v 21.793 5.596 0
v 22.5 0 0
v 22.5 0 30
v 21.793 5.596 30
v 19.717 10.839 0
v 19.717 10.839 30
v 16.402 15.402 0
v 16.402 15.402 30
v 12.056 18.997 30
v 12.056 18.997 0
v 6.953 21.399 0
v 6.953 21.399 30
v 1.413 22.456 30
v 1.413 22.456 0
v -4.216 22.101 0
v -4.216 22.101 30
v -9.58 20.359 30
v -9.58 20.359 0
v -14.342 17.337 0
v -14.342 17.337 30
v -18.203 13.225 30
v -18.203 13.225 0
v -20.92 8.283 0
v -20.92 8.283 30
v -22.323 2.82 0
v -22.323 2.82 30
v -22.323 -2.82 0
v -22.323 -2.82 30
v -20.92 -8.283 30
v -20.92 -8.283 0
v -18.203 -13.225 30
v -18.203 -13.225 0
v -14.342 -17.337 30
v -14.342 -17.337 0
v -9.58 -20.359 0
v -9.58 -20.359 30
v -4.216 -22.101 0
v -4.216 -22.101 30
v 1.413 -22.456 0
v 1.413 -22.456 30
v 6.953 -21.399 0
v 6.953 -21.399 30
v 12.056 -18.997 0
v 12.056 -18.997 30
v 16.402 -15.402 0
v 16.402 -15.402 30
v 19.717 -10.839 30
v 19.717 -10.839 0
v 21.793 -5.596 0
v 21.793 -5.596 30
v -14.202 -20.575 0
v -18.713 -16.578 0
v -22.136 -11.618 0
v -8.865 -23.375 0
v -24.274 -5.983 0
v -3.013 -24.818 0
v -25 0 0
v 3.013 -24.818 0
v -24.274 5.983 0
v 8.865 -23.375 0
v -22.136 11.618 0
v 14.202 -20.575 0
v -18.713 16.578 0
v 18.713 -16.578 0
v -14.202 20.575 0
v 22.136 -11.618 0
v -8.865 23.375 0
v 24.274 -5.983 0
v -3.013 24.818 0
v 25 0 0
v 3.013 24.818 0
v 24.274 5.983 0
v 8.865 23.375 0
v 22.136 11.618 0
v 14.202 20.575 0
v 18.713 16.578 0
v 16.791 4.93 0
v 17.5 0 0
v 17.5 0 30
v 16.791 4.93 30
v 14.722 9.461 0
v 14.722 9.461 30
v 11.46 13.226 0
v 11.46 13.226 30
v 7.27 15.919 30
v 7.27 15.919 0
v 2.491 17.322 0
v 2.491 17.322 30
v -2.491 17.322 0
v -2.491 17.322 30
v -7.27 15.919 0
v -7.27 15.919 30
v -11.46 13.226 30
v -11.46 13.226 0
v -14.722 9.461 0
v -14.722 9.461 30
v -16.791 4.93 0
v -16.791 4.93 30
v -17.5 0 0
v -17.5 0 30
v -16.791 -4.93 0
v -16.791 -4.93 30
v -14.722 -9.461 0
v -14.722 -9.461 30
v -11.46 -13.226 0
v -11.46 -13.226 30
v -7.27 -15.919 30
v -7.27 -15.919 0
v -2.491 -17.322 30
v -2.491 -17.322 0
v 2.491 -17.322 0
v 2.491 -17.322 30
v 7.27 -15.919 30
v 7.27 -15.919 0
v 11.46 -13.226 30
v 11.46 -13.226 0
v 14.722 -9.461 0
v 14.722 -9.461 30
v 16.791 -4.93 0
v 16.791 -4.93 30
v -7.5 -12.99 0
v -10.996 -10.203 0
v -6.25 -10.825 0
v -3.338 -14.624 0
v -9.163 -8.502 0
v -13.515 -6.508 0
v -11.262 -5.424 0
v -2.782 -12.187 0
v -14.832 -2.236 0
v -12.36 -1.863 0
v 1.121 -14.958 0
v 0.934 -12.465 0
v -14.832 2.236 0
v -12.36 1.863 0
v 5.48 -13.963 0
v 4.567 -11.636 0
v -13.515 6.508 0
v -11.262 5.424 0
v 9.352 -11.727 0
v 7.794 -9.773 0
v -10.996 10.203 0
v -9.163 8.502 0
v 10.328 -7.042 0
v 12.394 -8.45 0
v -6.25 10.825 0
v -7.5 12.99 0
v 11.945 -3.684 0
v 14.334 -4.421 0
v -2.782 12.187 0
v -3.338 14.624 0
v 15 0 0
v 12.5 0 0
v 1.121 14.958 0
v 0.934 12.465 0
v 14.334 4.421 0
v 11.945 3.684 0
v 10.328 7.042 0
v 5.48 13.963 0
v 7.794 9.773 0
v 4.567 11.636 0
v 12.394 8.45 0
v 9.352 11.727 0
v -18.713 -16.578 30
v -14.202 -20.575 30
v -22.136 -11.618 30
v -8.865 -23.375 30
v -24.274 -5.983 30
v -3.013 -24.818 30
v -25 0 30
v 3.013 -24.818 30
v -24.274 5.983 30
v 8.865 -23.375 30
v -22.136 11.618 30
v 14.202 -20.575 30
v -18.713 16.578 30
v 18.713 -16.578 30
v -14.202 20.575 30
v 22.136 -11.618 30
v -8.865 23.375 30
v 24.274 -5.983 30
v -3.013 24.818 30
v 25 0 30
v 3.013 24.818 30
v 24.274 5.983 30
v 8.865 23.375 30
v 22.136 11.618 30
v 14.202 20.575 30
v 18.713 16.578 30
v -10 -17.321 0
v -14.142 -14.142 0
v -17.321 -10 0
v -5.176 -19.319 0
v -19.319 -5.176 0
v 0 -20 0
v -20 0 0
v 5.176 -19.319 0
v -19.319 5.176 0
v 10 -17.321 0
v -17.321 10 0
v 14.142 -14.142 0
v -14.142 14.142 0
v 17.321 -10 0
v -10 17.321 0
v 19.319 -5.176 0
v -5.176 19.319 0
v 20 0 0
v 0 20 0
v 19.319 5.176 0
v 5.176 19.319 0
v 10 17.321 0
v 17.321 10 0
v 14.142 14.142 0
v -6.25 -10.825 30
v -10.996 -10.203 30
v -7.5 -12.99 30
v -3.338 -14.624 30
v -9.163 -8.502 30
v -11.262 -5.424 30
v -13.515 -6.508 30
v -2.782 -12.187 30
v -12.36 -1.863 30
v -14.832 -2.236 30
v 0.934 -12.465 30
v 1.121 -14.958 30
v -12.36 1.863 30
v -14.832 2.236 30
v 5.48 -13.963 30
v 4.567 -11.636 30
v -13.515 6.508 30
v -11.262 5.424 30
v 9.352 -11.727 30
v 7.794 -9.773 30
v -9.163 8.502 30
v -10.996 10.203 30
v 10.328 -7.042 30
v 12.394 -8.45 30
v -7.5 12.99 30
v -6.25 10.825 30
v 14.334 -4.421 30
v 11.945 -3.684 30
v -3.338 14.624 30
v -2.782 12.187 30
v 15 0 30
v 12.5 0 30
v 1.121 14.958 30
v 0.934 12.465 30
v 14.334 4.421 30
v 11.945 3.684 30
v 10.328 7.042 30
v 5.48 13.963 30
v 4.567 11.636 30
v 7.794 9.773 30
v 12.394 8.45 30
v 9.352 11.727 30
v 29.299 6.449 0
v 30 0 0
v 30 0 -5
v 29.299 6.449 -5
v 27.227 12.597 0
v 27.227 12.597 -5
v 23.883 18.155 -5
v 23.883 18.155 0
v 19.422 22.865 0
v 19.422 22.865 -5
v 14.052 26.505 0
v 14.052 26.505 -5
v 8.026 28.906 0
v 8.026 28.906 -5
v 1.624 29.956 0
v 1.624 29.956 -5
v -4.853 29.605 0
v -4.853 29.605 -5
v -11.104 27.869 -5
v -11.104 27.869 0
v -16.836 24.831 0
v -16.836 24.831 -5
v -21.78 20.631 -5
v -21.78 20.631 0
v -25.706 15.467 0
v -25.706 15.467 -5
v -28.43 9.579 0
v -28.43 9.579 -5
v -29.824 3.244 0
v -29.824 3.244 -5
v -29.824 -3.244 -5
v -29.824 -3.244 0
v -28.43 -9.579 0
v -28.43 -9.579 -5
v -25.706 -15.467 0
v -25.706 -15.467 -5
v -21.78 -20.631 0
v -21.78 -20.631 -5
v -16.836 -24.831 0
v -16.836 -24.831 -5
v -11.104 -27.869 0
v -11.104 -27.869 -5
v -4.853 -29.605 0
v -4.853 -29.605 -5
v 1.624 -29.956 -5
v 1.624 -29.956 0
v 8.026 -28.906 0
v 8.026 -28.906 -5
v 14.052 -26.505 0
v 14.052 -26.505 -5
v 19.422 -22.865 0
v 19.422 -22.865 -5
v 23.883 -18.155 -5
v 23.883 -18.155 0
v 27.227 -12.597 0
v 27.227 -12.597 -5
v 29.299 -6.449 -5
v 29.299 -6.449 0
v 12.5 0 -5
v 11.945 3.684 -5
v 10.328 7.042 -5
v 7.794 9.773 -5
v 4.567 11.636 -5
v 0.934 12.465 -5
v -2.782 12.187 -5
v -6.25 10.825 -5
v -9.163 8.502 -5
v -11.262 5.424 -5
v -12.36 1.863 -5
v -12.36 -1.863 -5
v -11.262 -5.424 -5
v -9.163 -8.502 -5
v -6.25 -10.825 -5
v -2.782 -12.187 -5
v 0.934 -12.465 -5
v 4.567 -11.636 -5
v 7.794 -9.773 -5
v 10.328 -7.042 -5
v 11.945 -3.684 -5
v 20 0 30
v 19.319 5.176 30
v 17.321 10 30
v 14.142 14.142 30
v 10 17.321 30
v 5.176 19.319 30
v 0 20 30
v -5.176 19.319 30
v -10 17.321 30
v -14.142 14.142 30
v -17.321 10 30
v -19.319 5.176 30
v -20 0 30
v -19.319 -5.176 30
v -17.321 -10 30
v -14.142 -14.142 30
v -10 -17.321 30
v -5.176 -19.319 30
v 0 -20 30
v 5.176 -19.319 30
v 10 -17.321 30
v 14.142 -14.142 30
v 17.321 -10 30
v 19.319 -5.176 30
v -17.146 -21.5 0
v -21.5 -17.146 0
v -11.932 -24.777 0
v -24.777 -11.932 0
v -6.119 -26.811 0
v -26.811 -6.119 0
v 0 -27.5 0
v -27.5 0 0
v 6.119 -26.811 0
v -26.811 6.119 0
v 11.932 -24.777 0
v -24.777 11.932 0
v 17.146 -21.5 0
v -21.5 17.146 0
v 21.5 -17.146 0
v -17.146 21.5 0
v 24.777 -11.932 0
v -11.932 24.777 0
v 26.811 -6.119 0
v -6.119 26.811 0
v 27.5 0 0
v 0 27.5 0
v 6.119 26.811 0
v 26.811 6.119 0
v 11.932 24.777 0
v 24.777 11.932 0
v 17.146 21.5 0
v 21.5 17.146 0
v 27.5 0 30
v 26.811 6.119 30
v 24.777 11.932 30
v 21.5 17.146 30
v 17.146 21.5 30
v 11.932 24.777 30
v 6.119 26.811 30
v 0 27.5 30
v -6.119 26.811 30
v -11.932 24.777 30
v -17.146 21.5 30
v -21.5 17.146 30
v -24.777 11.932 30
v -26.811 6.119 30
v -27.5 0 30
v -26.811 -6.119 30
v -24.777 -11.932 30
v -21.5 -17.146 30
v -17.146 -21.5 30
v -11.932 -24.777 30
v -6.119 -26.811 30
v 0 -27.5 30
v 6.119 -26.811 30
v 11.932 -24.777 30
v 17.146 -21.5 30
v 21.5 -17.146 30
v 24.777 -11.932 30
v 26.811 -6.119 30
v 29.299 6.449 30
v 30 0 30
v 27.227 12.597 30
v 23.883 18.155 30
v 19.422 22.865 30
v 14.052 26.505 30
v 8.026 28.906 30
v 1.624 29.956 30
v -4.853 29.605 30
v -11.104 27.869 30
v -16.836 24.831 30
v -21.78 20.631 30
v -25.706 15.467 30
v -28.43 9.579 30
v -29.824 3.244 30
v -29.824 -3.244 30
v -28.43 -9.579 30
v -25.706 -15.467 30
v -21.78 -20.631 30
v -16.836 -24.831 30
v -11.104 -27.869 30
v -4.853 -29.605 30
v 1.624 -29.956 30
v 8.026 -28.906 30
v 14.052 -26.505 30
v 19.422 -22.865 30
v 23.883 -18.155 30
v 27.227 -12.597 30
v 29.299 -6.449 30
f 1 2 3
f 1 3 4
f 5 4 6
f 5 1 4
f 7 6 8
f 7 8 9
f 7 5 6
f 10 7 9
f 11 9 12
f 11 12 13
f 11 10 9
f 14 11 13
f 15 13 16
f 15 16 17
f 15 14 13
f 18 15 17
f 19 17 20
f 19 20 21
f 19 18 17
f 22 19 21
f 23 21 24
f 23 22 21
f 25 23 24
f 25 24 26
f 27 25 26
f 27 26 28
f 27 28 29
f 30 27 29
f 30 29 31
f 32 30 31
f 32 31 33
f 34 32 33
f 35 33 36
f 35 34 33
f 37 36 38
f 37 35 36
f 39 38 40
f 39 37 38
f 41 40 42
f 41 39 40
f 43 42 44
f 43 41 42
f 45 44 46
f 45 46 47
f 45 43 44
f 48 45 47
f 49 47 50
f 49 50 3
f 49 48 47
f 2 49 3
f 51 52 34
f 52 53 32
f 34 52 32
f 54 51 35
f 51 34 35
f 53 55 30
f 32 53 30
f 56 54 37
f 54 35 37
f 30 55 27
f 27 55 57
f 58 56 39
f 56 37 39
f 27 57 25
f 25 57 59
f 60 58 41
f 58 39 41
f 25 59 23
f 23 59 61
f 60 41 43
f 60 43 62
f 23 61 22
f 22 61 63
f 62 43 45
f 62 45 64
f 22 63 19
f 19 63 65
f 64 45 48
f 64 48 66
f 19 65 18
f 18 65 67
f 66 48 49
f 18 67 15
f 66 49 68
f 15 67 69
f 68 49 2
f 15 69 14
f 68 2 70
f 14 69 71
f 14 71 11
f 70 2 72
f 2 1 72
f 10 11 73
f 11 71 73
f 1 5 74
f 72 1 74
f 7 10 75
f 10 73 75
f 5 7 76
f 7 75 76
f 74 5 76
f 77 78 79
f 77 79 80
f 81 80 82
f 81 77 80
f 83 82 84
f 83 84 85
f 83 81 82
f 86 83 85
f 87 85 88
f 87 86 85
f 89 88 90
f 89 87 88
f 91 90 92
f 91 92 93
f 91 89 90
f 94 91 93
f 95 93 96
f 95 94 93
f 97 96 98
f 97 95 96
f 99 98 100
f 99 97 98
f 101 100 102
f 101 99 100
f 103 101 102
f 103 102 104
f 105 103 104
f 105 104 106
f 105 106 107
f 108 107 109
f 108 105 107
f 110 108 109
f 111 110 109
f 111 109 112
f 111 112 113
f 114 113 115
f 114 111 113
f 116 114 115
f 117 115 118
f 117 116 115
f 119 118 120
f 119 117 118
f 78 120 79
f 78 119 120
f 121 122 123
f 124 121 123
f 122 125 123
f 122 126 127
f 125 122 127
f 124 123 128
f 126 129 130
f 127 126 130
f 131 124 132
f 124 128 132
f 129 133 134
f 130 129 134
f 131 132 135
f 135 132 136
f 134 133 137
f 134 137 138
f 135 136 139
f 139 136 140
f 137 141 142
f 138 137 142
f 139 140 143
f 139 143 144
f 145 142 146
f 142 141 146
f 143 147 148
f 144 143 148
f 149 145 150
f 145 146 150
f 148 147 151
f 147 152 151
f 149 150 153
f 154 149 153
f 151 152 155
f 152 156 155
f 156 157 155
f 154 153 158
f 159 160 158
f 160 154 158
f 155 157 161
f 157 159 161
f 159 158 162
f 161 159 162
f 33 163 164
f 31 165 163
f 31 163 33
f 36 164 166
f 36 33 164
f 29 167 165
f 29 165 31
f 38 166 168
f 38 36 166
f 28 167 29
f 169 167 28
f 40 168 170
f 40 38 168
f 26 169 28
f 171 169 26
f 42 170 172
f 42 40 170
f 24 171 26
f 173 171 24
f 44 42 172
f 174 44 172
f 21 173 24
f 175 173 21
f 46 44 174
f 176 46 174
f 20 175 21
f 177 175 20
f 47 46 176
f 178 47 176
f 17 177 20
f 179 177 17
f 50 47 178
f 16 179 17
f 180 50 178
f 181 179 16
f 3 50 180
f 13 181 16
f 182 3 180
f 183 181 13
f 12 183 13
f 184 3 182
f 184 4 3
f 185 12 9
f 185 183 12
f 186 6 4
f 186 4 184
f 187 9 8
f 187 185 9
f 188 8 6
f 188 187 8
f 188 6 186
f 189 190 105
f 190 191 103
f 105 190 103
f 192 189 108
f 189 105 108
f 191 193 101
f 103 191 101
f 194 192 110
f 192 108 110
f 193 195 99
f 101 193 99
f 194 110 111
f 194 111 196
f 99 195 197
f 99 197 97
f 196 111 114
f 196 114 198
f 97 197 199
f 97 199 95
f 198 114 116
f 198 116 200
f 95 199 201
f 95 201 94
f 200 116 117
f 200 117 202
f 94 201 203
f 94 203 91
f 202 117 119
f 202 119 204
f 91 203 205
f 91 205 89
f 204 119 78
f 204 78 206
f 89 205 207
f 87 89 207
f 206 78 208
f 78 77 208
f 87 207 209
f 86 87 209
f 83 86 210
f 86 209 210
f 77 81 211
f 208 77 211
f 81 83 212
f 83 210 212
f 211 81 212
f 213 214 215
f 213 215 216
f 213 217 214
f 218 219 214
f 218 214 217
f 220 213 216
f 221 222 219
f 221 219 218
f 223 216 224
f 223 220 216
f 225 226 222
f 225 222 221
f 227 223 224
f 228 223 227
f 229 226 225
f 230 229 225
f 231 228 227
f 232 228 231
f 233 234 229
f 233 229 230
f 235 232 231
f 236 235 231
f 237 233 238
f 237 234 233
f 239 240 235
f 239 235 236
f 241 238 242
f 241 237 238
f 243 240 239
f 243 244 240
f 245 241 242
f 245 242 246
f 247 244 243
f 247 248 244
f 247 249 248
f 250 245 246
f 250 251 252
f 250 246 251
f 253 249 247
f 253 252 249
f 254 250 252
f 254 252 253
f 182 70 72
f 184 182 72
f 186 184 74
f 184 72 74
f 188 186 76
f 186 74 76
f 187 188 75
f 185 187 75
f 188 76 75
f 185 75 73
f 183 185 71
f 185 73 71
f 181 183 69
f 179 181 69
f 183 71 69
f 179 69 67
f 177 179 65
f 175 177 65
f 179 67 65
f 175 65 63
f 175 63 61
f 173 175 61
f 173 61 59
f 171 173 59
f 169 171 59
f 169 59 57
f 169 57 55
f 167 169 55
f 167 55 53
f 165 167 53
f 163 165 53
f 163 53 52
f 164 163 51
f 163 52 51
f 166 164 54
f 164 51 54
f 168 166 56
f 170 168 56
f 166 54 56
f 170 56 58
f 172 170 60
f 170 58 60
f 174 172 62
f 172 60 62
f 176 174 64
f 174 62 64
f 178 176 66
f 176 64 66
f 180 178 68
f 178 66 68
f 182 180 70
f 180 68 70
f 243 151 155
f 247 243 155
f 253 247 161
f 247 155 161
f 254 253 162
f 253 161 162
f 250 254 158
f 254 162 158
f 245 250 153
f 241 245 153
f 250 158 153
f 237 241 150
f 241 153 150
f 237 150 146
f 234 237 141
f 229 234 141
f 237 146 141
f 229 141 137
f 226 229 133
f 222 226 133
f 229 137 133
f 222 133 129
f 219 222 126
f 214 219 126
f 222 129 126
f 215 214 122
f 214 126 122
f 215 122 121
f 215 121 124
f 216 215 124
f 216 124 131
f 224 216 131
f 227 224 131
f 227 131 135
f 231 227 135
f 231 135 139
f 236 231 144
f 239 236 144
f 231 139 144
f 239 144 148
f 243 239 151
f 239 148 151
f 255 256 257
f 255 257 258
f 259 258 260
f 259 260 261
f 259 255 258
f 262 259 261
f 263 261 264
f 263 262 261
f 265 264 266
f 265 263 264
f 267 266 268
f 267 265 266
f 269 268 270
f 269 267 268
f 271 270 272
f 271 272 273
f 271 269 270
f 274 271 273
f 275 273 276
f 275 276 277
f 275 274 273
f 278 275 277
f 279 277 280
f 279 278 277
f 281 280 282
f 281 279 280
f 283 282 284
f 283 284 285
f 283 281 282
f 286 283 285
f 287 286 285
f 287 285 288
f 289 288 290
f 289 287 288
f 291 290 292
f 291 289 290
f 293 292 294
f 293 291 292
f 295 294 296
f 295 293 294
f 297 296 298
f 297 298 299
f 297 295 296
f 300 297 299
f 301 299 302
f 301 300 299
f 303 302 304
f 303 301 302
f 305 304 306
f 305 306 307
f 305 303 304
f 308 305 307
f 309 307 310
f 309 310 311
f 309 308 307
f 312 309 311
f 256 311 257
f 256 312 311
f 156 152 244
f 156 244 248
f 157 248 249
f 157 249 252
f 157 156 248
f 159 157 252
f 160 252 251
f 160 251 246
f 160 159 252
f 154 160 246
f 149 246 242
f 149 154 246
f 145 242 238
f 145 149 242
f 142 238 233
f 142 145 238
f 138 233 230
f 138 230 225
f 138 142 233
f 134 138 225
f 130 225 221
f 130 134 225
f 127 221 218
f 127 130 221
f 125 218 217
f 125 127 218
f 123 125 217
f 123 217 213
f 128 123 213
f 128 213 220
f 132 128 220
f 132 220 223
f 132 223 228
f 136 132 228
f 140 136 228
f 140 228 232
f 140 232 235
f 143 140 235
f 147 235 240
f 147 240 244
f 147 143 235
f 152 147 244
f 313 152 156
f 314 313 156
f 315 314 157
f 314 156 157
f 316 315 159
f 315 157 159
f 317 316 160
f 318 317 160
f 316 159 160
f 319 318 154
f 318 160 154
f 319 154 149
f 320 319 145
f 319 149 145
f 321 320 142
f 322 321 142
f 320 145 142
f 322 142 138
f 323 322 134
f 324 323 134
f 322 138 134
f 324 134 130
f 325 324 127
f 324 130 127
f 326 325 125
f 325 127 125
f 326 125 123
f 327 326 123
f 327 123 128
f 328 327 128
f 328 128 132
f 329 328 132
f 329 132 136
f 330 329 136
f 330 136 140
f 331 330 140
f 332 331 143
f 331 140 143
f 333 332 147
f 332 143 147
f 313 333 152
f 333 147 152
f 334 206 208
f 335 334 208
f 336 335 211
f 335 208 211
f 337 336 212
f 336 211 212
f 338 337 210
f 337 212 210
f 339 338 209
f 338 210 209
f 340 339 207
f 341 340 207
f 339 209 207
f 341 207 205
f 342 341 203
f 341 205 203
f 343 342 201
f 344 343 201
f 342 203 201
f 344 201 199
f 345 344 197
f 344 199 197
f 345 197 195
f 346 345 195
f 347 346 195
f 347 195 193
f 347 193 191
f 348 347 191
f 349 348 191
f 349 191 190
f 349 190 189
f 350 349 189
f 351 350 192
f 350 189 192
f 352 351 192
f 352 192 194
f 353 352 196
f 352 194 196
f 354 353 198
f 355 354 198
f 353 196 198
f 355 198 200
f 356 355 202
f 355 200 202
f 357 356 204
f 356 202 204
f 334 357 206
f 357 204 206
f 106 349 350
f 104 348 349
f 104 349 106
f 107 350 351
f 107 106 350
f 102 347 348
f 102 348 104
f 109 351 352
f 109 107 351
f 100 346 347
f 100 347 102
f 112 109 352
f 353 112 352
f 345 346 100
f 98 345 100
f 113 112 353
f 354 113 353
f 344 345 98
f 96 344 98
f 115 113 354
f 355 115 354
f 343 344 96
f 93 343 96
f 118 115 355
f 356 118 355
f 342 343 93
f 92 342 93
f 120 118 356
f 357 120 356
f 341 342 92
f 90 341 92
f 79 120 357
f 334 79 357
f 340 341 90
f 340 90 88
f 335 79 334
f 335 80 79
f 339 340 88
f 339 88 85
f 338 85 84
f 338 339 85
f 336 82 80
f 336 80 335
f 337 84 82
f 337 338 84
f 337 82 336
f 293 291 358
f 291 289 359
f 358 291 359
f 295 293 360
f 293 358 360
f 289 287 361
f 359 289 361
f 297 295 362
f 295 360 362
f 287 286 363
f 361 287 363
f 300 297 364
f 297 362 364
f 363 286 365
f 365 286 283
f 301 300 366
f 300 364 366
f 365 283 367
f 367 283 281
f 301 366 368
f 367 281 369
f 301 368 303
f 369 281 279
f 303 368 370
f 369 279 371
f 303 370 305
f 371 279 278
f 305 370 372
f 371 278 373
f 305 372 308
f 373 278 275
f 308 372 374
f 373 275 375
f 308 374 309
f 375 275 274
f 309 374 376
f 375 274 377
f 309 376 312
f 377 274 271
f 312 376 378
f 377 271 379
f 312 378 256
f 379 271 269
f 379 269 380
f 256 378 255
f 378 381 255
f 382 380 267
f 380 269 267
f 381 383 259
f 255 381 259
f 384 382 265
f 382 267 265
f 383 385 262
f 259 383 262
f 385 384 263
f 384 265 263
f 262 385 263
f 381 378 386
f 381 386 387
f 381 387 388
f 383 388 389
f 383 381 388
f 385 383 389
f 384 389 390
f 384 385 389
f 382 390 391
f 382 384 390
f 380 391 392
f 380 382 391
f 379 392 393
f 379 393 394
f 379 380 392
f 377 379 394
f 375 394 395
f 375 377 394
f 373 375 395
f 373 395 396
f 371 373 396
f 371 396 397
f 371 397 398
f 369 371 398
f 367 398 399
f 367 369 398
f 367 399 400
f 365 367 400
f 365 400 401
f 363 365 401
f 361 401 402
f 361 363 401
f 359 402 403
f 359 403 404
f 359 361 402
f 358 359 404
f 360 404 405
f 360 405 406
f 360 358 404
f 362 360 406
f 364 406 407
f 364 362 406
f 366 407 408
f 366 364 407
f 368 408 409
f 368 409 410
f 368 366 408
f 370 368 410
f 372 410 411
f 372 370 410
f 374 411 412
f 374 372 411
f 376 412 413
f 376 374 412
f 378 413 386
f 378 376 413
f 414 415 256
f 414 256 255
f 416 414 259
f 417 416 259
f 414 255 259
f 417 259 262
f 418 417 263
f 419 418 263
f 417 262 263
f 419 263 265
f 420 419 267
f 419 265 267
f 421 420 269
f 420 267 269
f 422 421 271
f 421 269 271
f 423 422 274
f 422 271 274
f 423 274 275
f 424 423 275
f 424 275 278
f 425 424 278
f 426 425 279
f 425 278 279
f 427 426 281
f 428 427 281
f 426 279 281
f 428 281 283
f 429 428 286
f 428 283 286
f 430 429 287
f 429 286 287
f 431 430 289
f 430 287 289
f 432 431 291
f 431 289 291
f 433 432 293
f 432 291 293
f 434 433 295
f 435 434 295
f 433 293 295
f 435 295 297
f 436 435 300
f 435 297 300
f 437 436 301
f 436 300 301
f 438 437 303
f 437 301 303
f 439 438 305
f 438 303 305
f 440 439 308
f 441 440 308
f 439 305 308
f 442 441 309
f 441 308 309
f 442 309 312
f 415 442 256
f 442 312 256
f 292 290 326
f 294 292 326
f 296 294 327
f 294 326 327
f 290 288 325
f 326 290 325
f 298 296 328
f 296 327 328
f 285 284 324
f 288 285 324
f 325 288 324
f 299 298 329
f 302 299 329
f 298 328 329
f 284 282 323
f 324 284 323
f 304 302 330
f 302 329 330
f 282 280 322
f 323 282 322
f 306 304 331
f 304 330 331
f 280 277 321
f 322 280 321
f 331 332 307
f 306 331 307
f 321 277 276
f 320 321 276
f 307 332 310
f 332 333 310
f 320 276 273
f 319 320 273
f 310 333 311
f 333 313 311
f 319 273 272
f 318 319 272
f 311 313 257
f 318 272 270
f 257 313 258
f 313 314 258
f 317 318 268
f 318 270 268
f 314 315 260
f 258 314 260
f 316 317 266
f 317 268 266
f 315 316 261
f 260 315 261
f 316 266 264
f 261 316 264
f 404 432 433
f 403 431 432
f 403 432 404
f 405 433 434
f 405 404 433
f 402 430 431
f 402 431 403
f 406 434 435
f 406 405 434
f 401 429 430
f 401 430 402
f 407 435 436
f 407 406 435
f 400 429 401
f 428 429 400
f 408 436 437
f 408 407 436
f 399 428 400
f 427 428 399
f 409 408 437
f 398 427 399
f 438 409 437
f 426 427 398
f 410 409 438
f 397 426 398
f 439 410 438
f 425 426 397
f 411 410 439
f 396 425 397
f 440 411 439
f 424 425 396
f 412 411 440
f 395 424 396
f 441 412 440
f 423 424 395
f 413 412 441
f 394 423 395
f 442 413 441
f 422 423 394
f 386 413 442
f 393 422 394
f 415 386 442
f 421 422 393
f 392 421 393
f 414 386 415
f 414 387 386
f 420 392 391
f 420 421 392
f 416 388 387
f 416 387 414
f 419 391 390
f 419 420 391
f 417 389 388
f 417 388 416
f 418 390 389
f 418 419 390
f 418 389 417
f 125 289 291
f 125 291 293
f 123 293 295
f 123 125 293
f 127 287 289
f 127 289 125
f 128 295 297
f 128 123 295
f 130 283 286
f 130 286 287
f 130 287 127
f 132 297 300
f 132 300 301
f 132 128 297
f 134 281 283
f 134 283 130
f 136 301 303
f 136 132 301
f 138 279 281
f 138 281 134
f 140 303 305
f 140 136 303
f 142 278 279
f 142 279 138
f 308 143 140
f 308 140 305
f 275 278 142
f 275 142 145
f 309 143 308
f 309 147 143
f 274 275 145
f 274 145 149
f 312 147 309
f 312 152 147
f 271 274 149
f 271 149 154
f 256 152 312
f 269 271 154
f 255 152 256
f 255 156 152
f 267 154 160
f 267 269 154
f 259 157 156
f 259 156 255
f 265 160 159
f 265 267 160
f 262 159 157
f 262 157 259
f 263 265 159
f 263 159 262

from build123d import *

# Parameters (mm, degrees)
F0_R     = 15
F0_R_2   = 12.5
F1_DEPTH = 30
F0_R_3   = 20
F0_R_4   = 17.5
F0_R_5   = 25
F0_R_6   = 22.5
F0_R_7   = 30
F0_R_8   = 27.5
F2_R     = 30
F2_R_2   = 12.5
F3_DEPTH = 5


with BuildPart() as f1:
    # F0 (on Top) → F1 (new body)
    with BuildSketch(Plane.XY):
        Circle(F0_R)
        Circle(F0_R_2, mode=Mode.SUBTRACT)
    extrude(amount=F1_DEPTH)


with BuildPart() as f1b:
    # F0 (on Top) → F1, piece 2 (new body)
    with BuildSketch(Plane.XY):
        Circle(F0_R_3)
        Circle(F0_R_4, mode=Mode.SUBTRACT)
    extrude(amount=F1_DEPTH)


with BuildPart() as f1c:
    # F0 (on Top) → F1, piece 3 (new body)
    with BuildSketch(Plane.XY):
        Circle(F0_R_5)
        Circle(F0_R_6, mode=Mode.SUBTRACT)
    extrude(amount=F1_DEPTH)


with BuildPart() as f1d:
    # F0 (on Top) → F1, piece 4 (new body)
    with BuildSketch(Plane.XY):
        Circle(F0_R_7)
        Circle(F0_R_8, mode=Mode.SUBTRACT)
    extrude(amount=F1_DEPTH)


with BuildPart() as f3:
    # F2 (on Top) → F3 (new body)
    with BuildSketch(Plane.XY):
        Circle(F2_R)
        Circle(F2_R_2, mode=Mode.SUBTRACT)
    extrude(amount=-F3_DEPTH)


solid = Compound([f1.part, f1b.part, f1c.part, f1d.part, f3.part])
